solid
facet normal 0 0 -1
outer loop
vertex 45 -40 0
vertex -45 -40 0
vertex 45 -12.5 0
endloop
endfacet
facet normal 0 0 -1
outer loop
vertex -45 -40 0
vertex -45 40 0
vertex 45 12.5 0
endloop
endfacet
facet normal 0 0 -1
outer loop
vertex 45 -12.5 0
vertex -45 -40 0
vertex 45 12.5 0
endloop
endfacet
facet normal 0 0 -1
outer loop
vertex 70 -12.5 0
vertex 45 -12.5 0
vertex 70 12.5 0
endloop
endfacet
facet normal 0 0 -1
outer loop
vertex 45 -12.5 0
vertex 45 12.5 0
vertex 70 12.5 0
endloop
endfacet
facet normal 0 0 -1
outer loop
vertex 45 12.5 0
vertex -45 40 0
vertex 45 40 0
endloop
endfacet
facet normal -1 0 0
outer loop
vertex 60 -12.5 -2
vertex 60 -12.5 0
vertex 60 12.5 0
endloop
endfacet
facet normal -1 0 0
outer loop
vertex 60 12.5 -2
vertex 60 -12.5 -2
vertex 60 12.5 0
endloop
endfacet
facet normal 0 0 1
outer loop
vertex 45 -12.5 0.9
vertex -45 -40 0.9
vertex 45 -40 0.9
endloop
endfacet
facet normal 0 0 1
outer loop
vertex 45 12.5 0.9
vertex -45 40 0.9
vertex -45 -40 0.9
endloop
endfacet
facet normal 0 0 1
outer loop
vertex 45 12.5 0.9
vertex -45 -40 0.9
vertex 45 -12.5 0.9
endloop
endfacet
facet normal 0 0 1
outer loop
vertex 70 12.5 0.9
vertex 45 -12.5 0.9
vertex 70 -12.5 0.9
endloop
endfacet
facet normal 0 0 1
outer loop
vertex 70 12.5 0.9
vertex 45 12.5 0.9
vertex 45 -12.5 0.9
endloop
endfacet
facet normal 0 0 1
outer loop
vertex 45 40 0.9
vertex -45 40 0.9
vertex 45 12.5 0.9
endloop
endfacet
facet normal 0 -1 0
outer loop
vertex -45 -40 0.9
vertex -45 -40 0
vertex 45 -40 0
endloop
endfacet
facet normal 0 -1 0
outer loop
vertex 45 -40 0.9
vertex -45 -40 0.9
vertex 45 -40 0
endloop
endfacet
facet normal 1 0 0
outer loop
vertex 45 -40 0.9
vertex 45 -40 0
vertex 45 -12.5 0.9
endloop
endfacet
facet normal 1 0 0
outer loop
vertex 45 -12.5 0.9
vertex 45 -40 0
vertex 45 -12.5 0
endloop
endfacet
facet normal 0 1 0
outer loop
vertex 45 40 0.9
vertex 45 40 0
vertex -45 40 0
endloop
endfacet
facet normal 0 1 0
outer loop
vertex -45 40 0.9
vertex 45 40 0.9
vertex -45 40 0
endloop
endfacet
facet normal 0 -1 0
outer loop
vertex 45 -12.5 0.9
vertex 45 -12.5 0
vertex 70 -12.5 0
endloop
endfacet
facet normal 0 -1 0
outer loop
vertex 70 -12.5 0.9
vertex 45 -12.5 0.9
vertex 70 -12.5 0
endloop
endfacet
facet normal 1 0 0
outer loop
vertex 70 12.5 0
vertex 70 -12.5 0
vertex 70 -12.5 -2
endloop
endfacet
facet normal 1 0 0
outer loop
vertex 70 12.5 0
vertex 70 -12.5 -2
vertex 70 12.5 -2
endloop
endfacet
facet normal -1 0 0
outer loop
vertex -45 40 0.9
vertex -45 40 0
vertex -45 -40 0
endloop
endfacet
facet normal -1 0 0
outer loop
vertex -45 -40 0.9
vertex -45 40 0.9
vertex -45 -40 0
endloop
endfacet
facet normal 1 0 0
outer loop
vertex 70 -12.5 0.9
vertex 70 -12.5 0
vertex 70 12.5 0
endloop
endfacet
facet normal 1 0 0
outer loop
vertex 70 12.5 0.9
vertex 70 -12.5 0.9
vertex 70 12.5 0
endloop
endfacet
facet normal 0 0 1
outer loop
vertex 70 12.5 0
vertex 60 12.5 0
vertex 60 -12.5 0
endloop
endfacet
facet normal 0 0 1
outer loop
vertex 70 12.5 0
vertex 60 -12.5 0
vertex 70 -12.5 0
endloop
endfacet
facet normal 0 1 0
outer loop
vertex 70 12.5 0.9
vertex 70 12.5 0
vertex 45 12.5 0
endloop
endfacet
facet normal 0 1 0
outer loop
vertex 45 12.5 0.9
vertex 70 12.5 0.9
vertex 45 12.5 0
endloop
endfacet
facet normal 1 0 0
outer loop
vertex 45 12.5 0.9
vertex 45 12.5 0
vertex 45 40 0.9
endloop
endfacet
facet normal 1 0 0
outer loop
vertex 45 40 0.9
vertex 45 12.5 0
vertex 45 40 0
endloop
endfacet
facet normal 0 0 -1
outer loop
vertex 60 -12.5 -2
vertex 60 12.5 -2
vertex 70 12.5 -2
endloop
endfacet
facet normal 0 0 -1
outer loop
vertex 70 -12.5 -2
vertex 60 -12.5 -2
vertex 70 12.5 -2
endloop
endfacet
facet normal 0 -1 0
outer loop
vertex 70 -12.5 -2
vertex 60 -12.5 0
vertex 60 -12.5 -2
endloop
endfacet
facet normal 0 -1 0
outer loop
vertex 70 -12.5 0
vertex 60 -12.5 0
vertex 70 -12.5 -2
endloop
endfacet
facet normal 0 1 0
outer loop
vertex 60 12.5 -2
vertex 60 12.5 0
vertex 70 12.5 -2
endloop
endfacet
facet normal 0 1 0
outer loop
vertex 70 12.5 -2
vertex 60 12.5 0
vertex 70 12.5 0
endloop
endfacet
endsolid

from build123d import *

# Parameters (mm, degrees)
F0_W     = 15
F0_H     = 25
F0_W_2   = 10
F1_DEPTH = 0.9
F2_DEPTH = 2


with BuildPart() as f1:
    # F0 (on Top) → F1 (new body)
    with BuildSketch(Plane.XY):
        Polygon((45, 12.5), (45, 40), (-45, 40), (-45, -40), (45, -40), (45, -12.5), align=None)
        with Locations((52.5, 0)):
            Rectangle(F0_W, F0_H)
        with Locations((65, 0)):
            Rectangle(F0_W_2, F0_H)
    extrude(amount=F1_DEPTH)


with BuildPart() as f2:
    # F0 (on Top) → F2 (new body)
    with BuildSketch(Plane.XY):
        with Locations((65, 0)):
            Rectangle(F0_W_2, F0_H)
    extrude(amount=-F2_DEPTH)


solid = Compound([f1.part, f2.part])
